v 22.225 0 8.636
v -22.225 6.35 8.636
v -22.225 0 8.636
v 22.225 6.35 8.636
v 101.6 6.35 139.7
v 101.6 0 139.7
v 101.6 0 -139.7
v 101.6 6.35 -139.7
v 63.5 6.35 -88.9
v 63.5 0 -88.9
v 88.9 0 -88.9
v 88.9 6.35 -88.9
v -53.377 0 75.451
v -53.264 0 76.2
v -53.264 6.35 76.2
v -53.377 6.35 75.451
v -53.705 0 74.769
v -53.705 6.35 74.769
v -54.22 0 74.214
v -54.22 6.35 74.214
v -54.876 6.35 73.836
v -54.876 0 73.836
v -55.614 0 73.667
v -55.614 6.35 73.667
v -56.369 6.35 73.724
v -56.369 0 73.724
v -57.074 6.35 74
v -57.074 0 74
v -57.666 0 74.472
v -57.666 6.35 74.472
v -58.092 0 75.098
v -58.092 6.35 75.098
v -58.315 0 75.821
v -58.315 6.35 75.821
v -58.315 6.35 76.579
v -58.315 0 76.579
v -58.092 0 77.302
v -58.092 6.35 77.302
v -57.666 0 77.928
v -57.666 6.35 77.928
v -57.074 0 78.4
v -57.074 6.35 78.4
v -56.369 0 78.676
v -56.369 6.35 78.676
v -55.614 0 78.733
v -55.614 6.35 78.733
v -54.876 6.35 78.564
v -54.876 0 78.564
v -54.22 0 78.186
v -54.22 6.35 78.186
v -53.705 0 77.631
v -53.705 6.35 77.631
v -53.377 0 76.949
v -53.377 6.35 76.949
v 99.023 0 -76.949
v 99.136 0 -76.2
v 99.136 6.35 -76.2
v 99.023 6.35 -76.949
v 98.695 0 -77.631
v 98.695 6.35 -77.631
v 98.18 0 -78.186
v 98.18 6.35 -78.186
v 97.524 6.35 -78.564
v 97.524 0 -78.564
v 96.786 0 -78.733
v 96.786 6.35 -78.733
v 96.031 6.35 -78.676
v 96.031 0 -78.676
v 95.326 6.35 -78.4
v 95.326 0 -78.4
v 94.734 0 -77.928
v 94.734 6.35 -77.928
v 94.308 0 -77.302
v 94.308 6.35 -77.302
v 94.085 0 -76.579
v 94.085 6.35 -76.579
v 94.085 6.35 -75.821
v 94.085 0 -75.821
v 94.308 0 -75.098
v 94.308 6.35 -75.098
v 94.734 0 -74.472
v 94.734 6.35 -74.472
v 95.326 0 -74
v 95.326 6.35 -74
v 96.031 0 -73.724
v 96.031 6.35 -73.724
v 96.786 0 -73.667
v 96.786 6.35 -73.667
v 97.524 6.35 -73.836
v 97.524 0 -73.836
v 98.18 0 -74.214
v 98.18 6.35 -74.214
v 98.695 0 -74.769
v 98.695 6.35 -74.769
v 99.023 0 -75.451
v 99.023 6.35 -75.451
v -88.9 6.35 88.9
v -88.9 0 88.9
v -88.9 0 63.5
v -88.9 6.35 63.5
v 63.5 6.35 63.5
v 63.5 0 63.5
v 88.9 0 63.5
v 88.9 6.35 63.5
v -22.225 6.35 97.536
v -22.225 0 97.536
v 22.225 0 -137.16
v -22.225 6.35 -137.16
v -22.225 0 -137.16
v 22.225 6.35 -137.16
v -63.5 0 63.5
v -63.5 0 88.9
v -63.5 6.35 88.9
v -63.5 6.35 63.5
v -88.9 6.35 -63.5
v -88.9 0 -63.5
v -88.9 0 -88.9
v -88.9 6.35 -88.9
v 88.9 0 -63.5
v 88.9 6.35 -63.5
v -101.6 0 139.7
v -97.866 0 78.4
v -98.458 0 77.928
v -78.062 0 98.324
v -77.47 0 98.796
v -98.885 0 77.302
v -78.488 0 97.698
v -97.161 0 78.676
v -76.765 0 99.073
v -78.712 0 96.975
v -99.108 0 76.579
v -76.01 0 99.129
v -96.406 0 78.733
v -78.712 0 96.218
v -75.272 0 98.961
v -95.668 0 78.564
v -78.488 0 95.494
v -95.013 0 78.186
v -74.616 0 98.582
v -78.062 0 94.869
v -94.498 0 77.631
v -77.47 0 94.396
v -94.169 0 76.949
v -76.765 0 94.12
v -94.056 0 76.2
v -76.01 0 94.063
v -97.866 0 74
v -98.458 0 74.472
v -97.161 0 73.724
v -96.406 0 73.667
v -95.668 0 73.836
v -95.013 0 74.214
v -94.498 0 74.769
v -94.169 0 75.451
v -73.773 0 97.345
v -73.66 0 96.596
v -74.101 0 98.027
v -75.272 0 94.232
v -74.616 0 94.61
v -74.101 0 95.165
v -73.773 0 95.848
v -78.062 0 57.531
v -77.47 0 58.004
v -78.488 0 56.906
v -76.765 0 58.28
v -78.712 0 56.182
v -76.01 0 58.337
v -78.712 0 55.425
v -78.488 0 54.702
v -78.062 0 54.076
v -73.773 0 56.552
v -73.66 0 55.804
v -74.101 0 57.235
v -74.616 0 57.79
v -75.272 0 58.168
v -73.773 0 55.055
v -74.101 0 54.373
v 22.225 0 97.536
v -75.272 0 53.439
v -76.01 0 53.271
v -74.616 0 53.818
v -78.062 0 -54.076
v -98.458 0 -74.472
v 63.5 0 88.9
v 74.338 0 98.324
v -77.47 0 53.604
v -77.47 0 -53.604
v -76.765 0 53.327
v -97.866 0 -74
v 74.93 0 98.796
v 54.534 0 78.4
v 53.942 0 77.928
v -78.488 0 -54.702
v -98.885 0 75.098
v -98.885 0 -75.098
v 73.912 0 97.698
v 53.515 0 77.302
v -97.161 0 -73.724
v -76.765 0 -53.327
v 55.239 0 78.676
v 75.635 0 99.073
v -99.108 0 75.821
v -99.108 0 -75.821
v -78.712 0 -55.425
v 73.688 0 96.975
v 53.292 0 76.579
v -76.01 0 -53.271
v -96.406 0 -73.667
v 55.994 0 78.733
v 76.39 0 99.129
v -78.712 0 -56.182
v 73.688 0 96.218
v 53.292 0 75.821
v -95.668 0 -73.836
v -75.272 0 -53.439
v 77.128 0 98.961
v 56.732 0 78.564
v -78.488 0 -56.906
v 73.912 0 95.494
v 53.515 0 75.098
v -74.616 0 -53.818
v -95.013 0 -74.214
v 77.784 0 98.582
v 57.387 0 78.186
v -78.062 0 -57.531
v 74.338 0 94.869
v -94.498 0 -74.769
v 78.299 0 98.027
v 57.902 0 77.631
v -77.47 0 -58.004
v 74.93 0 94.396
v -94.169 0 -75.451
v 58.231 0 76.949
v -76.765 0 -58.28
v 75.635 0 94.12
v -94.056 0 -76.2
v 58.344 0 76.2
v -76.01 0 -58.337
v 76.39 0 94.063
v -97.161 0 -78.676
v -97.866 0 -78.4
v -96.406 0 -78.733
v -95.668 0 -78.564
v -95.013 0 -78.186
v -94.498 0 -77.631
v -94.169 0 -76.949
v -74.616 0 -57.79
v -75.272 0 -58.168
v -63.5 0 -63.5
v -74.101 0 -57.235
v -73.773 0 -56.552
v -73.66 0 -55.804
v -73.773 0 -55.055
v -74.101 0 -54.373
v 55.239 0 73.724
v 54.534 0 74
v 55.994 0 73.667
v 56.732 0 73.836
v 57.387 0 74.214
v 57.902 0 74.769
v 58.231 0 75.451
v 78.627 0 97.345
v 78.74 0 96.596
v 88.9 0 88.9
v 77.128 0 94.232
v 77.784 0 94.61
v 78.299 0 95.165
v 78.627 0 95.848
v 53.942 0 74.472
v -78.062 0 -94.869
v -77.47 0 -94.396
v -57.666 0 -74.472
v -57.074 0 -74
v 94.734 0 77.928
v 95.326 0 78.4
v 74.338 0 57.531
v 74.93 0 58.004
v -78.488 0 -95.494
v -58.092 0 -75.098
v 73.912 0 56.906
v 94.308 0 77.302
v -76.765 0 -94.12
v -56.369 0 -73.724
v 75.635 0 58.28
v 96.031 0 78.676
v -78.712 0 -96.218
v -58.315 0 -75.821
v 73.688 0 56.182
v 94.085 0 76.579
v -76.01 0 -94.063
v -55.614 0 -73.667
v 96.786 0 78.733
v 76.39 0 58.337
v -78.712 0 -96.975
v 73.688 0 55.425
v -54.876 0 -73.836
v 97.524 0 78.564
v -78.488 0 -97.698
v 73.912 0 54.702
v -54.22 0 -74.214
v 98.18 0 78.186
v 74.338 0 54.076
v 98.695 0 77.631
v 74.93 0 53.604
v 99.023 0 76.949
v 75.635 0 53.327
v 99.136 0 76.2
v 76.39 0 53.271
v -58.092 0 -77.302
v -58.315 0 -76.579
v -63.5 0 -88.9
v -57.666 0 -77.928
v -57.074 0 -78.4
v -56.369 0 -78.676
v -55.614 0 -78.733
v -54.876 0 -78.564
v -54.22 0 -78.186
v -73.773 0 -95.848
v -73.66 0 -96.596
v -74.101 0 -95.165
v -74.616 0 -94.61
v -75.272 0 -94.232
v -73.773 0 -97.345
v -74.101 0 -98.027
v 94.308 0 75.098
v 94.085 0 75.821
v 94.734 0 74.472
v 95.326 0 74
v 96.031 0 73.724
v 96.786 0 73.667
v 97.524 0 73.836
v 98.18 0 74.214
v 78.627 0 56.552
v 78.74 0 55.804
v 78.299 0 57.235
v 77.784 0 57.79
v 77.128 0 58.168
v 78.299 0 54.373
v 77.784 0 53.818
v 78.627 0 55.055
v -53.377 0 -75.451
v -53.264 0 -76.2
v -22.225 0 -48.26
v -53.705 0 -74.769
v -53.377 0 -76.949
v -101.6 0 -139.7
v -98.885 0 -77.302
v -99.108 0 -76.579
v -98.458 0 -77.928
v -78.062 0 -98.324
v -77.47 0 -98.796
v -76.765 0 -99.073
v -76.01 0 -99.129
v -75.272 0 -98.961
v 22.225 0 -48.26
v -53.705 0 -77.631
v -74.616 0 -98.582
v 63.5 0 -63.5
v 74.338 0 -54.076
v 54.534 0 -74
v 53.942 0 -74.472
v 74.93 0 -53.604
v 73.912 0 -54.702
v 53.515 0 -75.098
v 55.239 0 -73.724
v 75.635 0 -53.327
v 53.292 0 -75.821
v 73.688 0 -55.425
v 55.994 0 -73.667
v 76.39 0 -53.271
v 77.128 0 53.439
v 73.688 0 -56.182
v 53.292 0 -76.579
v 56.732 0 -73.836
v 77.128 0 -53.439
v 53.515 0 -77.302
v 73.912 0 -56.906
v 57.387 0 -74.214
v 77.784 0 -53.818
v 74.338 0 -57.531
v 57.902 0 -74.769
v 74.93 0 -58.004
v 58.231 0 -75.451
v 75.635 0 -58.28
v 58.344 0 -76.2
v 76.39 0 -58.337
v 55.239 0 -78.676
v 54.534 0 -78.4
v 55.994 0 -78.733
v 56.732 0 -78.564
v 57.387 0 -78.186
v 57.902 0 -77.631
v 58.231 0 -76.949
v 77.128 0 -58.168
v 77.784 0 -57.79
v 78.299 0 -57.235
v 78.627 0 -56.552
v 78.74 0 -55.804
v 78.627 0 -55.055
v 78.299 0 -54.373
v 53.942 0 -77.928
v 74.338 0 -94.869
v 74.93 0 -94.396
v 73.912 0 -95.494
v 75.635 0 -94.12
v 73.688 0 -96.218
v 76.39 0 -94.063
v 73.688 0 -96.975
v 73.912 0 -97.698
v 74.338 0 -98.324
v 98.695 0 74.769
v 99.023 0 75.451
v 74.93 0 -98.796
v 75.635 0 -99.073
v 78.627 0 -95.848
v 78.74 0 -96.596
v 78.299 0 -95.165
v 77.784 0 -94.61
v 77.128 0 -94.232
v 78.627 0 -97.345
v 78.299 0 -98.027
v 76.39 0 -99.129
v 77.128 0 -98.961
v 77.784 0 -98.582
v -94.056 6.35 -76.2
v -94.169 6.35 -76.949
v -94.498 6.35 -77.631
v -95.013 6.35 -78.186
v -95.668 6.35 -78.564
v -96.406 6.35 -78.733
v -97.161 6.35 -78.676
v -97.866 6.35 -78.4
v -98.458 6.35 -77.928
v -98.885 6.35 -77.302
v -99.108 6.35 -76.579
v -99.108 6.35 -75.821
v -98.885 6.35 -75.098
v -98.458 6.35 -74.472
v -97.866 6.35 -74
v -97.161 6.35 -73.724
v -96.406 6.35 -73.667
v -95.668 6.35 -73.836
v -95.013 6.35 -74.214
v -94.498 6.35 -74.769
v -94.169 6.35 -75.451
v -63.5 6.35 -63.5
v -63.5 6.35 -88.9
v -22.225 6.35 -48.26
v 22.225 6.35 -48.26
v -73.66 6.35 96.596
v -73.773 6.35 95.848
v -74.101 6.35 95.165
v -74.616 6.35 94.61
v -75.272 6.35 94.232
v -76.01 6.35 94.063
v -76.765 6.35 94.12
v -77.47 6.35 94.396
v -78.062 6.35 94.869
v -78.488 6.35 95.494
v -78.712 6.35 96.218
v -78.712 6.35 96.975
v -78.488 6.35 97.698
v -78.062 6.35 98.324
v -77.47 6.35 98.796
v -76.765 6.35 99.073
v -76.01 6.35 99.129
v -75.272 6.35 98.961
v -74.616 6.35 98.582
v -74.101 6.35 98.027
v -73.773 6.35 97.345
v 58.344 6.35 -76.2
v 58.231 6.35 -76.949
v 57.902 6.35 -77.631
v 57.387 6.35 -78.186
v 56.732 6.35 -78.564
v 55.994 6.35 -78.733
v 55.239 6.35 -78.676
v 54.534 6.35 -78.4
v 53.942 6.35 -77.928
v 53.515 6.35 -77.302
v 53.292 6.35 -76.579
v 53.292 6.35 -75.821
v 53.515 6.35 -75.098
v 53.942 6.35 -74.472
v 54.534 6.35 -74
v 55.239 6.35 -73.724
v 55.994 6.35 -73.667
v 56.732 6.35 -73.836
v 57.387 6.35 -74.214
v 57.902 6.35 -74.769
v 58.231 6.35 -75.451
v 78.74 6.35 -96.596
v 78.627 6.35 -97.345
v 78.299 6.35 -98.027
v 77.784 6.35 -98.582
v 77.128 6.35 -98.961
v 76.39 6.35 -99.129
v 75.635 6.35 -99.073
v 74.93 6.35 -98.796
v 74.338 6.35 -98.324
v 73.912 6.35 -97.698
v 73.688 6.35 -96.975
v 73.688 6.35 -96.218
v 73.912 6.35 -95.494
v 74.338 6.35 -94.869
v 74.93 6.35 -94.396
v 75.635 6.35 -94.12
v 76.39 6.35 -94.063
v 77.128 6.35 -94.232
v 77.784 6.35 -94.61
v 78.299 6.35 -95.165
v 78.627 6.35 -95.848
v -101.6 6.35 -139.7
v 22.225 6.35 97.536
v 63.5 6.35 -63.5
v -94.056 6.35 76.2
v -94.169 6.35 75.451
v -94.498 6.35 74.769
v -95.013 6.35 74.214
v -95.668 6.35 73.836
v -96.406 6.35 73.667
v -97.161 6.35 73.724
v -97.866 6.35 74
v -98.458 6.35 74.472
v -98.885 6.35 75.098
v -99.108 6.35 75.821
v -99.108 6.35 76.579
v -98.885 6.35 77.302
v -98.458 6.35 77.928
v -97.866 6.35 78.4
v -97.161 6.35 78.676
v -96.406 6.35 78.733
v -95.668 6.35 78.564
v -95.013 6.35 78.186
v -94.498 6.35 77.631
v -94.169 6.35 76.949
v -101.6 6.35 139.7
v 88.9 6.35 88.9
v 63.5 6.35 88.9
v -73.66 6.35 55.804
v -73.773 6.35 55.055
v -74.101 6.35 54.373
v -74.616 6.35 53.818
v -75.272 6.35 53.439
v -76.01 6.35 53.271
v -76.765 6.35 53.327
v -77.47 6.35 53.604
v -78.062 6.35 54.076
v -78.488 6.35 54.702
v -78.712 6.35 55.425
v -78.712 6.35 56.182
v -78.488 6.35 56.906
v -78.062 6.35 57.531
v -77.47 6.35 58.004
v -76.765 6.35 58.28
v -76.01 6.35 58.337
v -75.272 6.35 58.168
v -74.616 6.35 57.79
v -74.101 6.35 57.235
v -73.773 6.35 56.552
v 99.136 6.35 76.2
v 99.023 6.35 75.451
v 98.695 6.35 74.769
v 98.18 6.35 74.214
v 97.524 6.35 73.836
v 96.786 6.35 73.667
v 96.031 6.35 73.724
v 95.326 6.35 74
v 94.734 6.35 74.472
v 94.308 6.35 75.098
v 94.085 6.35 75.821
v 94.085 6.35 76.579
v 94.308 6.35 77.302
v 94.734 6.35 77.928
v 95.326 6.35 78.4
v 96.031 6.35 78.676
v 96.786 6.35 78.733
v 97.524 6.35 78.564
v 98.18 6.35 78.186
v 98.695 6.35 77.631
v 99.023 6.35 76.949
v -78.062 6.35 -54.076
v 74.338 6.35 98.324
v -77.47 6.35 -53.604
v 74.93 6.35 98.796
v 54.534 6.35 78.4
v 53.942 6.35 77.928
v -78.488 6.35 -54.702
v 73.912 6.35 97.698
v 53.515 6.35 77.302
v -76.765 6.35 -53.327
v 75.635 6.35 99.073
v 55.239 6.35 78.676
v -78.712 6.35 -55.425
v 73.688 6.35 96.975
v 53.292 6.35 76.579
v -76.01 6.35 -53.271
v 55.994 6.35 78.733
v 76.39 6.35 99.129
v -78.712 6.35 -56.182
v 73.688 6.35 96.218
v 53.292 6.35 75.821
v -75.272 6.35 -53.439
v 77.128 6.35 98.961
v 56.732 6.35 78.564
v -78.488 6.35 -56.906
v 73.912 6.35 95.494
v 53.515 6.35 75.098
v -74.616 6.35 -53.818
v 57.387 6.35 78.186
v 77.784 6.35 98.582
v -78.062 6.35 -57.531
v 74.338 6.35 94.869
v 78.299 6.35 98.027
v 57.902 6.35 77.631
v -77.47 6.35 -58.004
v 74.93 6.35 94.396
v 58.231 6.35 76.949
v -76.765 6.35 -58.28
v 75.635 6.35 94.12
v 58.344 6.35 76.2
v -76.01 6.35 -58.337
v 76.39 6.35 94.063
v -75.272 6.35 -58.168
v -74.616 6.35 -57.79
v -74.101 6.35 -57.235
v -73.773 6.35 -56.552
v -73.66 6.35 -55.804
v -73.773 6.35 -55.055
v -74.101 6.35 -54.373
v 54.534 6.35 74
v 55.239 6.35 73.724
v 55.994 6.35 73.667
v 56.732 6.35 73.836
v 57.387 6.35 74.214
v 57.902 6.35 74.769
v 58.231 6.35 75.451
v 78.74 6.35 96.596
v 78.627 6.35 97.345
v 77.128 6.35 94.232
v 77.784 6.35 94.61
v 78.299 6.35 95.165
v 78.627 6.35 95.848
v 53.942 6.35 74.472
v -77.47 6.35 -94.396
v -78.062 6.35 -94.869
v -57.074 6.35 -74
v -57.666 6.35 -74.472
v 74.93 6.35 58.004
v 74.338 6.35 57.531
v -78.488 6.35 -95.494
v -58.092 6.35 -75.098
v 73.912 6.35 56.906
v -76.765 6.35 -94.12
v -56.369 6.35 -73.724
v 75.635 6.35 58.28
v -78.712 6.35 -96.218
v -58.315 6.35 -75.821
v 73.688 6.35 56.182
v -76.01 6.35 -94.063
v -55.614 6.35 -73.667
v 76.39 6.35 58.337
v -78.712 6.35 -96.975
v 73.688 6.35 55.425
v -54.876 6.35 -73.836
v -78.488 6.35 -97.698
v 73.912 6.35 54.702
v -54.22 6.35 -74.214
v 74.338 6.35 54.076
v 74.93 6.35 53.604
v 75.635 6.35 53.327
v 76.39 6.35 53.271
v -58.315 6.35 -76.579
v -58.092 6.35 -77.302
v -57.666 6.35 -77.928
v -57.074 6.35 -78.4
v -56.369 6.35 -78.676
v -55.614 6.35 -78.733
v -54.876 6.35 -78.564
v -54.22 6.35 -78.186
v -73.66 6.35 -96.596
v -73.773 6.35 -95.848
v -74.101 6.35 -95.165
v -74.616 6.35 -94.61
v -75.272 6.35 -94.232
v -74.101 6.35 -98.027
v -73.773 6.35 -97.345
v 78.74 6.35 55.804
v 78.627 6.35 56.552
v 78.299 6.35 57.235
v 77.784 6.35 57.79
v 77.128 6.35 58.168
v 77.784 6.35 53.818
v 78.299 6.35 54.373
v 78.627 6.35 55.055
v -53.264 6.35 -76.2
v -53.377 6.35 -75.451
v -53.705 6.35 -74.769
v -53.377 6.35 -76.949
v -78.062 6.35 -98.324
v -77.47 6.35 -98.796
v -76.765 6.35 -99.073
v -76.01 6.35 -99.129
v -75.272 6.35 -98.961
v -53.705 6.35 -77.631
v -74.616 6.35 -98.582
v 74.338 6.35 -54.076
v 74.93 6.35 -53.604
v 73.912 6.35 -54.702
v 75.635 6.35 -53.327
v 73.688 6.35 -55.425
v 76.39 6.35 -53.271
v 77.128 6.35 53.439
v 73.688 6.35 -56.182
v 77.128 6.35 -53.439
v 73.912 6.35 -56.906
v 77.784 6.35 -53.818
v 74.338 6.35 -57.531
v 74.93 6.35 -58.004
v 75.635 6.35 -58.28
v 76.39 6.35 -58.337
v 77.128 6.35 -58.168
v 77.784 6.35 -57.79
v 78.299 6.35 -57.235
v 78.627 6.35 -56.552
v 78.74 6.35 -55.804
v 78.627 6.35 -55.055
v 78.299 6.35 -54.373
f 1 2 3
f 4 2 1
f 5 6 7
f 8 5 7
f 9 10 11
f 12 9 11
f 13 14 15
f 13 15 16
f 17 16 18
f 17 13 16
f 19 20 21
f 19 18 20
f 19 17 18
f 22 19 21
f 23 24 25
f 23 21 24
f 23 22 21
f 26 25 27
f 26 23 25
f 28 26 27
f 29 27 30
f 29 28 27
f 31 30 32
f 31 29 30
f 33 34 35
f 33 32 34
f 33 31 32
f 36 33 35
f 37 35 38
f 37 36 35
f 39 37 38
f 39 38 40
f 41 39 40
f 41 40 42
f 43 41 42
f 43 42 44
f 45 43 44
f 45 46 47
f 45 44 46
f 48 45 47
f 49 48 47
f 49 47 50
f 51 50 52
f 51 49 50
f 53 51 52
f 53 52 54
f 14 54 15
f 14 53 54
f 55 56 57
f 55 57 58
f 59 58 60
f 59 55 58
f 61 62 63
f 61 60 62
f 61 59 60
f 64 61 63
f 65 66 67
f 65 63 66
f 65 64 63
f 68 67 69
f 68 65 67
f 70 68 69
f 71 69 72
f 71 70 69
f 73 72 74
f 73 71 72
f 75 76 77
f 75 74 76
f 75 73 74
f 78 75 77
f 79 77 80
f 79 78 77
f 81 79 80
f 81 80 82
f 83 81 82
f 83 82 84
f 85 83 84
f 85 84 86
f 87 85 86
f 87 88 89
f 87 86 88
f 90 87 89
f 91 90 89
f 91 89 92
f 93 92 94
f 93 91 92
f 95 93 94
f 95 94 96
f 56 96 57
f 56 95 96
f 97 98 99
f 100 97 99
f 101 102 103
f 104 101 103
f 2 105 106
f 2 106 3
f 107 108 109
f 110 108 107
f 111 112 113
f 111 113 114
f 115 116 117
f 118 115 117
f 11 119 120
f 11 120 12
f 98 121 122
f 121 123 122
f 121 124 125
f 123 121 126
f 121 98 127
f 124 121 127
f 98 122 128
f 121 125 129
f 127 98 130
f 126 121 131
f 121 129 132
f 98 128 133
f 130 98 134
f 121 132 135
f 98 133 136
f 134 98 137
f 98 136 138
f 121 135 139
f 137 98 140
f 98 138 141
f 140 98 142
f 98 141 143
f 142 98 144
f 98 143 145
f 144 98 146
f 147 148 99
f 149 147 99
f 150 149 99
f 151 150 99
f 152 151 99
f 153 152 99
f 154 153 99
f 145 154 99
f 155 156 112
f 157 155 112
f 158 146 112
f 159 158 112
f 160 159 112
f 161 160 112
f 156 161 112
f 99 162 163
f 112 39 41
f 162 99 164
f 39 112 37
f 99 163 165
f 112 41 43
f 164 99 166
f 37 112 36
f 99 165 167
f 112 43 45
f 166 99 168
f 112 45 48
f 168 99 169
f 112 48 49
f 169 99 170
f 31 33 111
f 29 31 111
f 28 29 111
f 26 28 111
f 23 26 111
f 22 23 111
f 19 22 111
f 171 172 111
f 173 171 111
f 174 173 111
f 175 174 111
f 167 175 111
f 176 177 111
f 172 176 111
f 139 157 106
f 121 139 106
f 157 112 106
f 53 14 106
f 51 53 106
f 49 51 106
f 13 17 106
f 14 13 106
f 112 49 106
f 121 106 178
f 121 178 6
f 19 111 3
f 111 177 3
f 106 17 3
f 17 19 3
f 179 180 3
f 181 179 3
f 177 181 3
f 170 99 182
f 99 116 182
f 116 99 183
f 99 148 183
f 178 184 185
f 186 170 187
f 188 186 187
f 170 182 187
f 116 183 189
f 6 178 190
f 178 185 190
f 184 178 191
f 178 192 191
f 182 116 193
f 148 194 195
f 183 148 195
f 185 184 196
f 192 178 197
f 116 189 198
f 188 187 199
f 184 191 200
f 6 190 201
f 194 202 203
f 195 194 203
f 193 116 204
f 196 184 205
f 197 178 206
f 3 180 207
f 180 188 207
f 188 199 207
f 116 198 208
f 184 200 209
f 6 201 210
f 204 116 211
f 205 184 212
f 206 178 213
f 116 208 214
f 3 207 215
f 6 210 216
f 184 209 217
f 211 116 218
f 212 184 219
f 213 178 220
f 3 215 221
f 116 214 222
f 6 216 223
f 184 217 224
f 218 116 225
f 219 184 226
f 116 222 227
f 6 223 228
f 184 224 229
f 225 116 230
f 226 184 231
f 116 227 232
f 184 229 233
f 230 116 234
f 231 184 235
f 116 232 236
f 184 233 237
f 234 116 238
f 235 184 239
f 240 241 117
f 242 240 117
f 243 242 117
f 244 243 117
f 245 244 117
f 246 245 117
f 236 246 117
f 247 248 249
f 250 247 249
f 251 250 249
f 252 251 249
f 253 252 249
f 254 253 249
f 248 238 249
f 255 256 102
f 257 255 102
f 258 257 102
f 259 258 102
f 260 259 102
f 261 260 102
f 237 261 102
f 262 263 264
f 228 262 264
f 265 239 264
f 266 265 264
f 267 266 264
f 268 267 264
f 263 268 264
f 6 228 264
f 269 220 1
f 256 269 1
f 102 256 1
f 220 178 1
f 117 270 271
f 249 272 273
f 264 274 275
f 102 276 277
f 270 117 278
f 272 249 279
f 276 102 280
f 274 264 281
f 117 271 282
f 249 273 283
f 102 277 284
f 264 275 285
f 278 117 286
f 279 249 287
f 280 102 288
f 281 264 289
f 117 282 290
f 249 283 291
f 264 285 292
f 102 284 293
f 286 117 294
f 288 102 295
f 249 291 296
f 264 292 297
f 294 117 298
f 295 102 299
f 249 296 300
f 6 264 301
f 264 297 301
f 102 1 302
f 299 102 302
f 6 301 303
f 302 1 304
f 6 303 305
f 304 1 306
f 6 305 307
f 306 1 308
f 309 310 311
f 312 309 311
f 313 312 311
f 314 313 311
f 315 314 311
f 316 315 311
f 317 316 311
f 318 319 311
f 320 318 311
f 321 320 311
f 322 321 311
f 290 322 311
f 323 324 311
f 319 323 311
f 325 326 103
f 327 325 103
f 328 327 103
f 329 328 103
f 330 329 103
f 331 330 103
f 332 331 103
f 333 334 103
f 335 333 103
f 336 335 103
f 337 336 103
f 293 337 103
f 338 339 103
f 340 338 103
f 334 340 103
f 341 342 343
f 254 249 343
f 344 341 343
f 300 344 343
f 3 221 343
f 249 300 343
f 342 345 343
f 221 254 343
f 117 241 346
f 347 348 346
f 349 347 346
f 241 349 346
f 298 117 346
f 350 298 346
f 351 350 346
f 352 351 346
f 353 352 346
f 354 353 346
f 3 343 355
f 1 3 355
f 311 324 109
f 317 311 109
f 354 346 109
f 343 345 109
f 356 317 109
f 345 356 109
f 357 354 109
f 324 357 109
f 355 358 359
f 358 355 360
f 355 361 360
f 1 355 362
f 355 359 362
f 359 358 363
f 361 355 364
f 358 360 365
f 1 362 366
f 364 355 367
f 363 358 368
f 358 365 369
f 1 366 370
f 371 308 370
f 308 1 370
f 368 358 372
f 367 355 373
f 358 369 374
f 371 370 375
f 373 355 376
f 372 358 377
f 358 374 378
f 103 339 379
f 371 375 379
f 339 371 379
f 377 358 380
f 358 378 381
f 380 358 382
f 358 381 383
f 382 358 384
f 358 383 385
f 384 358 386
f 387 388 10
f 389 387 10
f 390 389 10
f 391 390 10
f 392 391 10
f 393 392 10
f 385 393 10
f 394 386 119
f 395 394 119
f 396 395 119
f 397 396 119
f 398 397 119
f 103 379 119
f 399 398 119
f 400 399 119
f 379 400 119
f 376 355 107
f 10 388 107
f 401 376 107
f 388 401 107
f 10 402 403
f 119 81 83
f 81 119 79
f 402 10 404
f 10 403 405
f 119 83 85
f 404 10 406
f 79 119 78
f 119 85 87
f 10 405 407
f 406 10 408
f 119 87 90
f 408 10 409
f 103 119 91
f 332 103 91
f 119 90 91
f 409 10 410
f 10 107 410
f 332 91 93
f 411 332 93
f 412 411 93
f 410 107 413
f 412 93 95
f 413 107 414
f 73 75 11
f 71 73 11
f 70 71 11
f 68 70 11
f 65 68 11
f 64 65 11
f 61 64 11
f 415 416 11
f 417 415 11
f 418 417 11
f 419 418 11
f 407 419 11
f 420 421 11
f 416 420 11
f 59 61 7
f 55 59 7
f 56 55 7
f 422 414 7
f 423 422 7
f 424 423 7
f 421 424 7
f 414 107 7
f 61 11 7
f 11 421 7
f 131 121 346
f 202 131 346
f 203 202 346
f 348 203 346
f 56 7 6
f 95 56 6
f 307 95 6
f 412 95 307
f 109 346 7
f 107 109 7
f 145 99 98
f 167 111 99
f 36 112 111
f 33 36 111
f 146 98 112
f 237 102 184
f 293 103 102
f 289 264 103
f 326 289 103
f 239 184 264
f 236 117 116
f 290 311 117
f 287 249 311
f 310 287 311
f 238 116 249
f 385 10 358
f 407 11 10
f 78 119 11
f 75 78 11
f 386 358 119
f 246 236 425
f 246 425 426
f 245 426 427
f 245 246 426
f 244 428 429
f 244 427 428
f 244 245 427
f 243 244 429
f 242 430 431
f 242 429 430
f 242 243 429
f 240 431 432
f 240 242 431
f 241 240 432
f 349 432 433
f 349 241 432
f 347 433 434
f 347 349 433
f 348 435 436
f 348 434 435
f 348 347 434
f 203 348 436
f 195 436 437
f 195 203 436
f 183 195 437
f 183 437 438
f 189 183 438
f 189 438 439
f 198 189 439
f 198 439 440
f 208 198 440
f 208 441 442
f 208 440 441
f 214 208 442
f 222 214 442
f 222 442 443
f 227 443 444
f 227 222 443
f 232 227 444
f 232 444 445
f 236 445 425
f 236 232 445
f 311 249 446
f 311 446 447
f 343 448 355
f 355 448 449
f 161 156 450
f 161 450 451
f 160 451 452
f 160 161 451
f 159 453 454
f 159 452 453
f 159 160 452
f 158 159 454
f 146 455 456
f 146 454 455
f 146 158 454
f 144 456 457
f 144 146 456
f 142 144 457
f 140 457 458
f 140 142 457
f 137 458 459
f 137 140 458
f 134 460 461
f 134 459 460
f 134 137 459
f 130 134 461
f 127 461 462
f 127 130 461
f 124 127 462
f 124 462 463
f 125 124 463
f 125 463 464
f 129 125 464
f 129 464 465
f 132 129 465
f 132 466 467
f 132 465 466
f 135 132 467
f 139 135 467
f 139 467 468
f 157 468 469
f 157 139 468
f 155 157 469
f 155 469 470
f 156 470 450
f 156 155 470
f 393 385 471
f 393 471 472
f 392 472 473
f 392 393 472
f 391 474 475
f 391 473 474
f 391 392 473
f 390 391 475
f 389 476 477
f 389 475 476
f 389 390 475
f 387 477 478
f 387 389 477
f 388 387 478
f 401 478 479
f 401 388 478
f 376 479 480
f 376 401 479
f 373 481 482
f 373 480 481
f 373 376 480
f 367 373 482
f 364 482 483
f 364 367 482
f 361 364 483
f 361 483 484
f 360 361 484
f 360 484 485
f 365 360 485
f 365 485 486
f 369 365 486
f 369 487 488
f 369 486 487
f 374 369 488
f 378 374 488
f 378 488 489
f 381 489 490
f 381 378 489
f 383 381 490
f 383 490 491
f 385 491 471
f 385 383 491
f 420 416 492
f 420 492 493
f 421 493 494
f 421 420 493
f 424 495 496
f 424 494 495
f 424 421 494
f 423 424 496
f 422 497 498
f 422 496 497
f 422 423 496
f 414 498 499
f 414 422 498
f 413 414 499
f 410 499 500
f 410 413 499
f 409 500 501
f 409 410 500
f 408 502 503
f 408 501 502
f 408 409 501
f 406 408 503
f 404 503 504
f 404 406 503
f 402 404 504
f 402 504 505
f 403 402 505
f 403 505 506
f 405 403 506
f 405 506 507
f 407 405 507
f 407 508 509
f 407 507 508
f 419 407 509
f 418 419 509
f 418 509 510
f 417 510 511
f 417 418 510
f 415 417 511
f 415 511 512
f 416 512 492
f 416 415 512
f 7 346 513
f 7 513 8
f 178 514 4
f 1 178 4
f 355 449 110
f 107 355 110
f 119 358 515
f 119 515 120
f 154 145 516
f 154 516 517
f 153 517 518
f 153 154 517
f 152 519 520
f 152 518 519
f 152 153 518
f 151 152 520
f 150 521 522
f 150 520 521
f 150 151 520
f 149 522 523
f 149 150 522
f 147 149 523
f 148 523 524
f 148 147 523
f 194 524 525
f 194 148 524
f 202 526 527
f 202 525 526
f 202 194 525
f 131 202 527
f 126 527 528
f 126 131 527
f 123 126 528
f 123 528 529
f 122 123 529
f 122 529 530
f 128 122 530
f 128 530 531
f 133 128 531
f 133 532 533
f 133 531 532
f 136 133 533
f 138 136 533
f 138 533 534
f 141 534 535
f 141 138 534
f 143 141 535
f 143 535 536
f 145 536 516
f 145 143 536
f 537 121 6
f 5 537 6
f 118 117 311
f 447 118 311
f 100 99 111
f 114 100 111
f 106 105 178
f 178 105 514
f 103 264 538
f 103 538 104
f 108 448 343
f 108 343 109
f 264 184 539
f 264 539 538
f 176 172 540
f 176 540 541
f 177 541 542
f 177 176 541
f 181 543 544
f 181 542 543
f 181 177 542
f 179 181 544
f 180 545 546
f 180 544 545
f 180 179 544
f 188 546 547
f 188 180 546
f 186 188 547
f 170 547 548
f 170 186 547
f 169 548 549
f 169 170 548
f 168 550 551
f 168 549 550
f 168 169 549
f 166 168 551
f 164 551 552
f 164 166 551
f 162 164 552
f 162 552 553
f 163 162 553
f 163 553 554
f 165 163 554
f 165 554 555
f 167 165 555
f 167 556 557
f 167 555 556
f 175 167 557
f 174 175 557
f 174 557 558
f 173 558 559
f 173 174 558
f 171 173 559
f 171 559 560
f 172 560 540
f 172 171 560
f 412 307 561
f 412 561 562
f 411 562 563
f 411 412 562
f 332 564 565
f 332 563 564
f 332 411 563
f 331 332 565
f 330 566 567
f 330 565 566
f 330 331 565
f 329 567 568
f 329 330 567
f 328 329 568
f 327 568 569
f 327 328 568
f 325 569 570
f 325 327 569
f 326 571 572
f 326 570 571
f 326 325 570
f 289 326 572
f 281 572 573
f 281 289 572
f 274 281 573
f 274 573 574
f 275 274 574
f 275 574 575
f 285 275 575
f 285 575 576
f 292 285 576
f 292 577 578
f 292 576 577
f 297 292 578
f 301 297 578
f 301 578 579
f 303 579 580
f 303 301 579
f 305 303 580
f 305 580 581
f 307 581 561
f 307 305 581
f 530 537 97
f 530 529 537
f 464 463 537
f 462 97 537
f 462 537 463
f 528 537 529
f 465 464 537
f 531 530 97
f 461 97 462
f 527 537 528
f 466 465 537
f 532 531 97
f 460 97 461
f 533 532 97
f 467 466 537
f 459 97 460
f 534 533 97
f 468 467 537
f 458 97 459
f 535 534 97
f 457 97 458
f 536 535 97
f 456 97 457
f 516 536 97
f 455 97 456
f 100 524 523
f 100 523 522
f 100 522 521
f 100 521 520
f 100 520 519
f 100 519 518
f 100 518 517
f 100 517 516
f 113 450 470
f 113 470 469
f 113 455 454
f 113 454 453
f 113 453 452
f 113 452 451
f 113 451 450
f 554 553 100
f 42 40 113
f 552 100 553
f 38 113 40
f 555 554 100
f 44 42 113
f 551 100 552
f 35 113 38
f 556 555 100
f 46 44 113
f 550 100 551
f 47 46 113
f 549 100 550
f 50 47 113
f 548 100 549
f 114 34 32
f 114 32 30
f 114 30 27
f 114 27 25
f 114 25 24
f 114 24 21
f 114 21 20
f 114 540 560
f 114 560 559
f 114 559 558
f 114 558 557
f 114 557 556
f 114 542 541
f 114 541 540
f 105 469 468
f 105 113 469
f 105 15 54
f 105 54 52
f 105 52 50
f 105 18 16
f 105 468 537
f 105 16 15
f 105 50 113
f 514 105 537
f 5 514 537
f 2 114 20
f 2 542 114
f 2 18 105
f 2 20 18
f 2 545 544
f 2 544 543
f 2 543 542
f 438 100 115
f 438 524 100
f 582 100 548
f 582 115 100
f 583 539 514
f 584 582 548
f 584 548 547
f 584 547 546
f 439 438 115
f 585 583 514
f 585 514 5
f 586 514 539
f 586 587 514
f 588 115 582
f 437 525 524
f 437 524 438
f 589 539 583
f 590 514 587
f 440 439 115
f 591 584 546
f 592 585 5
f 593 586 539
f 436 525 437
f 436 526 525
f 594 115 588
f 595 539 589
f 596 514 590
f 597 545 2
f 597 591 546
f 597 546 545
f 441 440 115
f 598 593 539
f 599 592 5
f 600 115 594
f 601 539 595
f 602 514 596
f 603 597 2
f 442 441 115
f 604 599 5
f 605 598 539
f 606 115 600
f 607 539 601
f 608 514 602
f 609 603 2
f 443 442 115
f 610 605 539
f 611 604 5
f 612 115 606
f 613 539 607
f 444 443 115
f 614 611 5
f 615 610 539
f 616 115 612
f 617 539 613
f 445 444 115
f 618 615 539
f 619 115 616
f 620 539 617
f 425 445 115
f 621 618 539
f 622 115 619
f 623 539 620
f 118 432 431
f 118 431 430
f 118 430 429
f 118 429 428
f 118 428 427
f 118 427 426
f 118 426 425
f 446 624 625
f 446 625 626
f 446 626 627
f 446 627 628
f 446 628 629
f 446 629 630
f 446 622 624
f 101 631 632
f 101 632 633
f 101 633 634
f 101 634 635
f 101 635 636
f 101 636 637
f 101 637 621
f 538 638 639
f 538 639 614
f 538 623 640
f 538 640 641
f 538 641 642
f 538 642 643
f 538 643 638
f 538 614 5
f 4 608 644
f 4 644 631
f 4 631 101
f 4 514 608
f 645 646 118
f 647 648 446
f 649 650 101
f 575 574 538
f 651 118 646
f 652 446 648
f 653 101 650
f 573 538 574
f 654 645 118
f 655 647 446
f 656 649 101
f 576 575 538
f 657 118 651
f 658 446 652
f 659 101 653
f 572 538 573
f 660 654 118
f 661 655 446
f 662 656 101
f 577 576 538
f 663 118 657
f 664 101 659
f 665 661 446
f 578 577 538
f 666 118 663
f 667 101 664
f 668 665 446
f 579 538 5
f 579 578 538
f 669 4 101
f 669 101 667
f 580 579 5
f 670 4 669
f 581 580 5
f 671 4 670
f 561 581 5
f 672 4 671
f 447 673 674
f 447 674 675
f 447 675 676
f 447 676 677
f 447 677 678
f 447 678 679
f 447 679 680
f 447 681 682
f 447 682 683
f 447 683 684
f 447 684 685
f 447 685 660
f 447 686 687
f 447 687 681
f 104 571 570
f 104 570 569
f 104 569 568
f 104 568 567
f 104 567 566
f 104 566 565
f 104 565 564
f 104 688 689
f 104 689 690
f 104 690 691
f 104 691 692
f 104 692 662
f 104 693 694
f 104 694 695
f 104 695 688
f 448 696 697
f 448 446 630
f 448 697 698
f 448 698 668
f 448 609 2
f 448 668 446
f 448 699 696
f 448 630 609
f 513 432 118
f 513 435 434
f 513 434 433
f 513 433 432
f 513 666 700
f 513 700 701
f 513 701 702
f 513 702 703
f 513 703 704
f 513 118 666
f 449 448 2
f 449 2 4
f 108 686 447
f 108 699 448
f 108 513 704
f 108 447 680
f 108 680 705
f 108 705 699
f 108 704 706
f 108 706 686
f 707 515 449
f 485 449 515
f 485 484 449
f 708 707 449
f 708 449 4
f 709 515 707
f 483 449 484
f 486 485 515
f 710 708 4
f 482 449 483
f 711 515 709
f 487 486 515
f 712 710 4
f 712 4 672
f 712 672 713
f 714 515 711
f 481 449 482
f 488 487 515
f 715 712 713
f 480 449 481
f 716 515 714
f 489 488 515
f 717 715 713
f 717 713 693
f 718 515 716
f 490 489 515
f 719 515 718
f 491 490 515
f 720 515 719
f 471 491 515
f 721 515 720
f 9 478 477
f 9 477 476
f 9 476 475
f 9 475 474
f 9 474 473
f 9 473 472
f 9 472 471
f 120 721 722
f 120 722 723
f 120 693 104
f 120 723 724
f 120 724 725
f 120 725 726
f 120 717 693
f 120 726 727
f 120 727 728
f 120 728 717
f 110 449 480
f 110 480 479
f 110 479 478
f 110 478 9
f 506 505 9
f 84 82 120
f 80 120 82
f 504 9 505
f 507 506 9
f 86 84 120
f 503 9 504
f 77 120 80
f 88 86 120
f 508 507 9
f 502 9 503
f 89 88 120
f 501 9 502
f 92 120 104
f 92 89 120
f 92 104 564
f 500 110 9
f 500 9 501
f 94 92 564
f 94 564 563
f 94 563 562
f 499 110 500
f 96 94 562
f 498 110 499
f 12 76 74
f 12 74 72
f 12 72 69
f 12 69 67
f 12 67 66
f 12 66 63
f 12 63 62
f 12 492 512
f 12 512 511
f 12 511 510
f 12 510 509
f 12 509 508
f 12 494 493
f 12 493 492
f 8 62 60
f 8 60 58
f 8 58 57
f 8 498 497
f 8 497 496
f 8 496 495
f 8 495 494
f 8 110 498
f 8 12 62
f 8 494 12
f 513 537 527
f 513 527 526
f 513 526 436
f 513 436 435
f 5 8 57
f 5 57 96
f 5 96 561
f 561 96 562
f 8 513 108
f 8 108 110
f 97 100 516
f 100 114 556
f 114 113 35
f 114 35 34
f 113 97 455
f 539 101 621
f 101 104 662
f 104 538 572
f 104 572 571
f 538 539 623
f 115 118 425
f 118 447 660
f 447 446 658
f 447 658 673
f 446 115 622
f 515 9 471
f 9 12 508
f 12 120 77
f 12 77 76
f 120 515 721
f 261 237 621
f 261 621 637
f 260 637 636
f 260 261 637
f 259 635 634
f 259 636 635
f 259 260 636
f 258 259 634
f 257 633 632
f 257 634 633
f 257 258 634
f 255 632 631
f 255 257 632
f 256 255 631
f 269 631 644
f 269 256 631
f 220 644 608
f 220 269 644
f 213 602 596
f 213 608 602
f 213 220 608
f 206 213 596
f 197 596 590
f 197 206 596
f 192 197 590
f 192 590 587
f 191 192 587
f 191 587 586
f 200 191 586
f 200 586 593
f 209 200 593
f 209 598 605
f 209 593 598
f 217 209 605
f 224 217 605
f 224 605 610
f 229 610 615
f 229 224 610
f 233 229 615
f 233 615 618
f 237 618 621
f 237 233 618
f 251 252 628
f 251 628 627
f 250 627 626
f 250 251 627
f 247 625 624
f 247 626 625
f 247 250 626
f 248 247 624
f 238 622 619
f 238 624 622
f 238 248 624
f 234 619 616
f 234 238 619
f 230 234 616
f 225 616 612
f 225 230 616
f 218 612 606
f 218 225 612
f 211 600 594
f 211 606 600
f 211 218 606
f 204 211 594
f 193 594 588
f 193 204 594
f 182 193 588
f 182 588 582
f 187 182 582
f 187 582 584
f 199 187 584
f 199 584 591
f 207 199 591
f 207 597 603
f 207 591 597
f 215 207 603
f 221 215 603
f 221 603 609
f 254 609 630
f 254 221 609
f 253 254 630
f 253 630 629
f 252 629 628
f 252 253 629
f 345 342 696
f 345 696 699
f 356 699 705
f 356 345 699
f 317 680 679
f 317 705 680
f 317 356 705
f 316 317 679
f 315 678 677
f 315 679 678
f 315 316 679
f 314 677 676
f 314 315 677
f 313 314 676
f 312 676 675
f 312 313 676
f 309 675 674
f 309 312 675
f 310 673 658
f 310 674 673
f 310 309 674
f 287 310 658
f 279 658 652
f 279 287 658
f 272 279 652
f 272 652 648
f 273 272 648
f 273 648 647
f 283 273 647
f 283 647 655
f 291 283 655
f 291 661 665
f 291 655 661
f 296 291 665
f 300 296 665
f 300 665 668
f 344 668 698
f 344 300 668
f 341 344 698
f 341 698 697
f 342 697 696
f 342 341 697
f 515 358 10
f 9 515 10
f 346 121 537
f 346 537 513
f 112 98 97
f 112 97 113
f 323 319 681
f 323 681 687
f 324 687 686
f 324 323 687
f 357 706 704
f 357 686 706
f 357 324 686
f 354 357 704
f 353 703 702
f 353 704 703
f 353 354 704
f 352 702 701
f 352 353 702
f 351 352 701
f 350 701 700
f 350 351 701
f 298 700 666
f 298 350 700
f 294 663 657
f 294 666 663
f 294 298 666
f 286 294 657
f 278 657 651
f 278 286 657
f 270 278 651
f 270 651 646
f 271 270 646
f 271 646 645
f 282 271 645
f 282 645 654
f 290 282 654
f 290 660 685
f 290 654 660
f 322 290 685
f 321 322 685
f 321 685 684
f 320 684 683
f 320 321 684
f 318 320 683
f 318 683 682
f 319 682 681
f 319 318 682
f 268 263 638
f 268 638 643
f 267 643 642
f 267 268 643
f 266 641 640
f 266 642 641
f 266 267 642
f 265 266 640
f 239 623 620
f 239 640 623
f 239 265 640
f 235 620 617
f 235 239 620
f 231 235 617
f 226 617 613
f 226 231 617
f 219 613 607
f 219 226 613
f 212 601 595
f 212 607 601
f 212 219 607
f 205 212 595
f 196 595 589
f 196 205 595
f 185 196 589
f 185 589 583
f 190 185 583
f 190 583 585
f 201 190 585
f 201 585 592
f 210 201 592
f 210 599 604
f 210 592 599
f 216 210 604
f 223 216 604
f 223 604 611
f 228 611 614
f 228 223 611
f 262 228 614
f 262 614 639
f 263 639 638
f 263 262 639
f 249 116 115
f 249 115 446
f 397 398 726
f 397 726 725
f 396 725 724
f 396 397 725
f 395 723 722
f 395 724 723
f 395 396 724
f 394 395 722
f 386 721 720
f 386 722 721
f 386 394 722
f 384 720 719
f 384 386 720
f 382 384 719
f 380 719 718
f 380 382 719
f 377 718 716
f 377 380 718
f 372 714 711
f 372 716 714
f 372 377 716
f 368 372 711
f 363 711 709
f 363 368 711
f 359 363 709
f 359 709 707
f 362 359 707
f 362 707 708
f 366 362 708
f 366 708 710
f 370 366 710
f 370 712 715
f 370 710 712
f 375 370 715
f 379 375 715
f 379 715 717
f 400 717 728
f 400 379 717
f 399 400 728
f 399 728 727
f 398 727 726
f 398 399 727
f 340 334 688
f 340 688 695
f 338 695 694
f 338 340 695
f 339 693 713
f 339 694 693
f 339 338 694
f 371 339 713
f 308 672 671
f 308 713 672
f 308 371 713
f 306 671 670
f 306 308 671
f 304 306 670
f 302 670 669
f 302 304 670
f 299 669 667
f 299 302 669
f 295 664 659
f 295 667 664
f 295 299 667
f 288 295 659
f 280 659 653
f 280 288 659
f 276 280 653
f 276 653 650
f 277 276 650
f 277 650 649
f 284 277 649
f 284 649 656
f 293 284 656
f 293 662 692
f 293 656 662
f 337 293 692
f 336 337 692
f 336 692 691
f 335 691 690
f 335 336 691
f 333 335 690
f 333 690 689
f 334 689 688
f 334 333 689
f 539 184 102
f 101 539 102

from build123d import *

# Parameters (mm, degrees)
SKETCH1_W               = 203.2
SKETCH1_H               = 279.4
BOSS_EXTRUDE1_DEPTH     = 6.35
CUT_EXTRUDE1_START      = -7.35
SKETCH2_R               = 2.54
SKETCH2_W               = 25.4
SKETCH2_H               = 25.4
CUT_EXTRUDE1_DEPTH      = 8.35
LPATTERN1_COUNT         = 2
LPATTERN1_PITCH         = 152.4
LPATTERN1_COUNT_DIR2    = 2
LPATTERN1_PITCH_DIR2    = 152.4
SKETCH3_W               = 44.45
SKETCH3_H               = 88.9
SKETCH3_R               = 10.16
CUT_EXTRUDE2_DEPTH      = 1
CUT_EXTRUDE2_DEPTH_BACK = 7.35


with BuildPart() as part:
    # Sketch1 → Boss-Extrude1 (new body)
    with BuildSketch(Plane(origin=(0, 0, 0), x_dir=(1, 0, 0), z_dir=(0, 1, 0))):
        Rectangle(SKETCH1_W, SKETCH1_H)
    extrude(amount=BOSS_EXTRUDE1_DEPTH)

    # Sketch2 → Cut-Extrude1 (cut)
    with BuildSketch(Plane(origin=(0, 6.35, 0), x_dir=(1, 0, 0), z_dir=(0, 1, 0)).offset(CUT_EXTRUDE1_START)):
        with Locations((-55.8038, 76.2)):
            Circle(SKETCH2_R)
        with Locations((-76.2, 55.8038)):
            Circle(SKETCH2_R)
        with Locations((-96.5962, 76.2)):
            Circle(SKETCH2_R)
        with Locations((-76.2, 96.5962)):
            Circle(SKETCH2_R)
        with Locations((-76.2, 76.2)):
            Rectangle(SKETCH2_W, SKETCH2_H)
    cut_extrude1 = extrude(amount=CUT_EXTRUDE1_DEPTH, mode=Mode.SUBTRACT)

    # LPattern1: Cut-Extrude1 2 × 2
    with Locations(*[(i * LPATTERN1_PITCH, 0, j * LPATTERN1_PITCH_DIR2) for i in range(LPATTERN1_COUNT) for j in range(LPATTERN1_COUNT_DIR2) if (i, j) != (0, 0)]):
        add(cut_extrude1, mode=Mode.SUBTRACT)

    # Sketch3 → Cut-Extrude2 (cut, two sides)
    with BuildSketch(Plane(origin=(0, 6.35, 0), x_dir=(1, 0, 0), z_dir=(0, 1, 0))) as cut_extrude2_sk:
        with Locations((0, 92.71)):
            Rectangle(SKETCH3_W, SKETCH3_H)
        with Locations((0, 76.2)):
            Circle(SKETCH3_R, mode=Mode.SUBTRACT)
        with Locations((0, -53.086)):
            Rectangle(SKETCH3_W, SKETCH3_H)
        with Locations((0, -76.2)):
            Circle(SKETCH3_R, mode=Mode.SUBTRACT)
        with Locations((0, 76.2)):
            Circle(SKETCH3_R)
        with Locations((0, -76.2)):
            Circle(SKETCH3_R)
    extrude(amount=CUT_EXTRUDE2_DEPTH, mode=Mode.SUBTRACT)
    extrude(cut_extrude2_sk.sketch, amount=-CUT_EXTRUDE2_DEPTH_BACK, mode=Mode.SUBTRACT)


solid = part.part
